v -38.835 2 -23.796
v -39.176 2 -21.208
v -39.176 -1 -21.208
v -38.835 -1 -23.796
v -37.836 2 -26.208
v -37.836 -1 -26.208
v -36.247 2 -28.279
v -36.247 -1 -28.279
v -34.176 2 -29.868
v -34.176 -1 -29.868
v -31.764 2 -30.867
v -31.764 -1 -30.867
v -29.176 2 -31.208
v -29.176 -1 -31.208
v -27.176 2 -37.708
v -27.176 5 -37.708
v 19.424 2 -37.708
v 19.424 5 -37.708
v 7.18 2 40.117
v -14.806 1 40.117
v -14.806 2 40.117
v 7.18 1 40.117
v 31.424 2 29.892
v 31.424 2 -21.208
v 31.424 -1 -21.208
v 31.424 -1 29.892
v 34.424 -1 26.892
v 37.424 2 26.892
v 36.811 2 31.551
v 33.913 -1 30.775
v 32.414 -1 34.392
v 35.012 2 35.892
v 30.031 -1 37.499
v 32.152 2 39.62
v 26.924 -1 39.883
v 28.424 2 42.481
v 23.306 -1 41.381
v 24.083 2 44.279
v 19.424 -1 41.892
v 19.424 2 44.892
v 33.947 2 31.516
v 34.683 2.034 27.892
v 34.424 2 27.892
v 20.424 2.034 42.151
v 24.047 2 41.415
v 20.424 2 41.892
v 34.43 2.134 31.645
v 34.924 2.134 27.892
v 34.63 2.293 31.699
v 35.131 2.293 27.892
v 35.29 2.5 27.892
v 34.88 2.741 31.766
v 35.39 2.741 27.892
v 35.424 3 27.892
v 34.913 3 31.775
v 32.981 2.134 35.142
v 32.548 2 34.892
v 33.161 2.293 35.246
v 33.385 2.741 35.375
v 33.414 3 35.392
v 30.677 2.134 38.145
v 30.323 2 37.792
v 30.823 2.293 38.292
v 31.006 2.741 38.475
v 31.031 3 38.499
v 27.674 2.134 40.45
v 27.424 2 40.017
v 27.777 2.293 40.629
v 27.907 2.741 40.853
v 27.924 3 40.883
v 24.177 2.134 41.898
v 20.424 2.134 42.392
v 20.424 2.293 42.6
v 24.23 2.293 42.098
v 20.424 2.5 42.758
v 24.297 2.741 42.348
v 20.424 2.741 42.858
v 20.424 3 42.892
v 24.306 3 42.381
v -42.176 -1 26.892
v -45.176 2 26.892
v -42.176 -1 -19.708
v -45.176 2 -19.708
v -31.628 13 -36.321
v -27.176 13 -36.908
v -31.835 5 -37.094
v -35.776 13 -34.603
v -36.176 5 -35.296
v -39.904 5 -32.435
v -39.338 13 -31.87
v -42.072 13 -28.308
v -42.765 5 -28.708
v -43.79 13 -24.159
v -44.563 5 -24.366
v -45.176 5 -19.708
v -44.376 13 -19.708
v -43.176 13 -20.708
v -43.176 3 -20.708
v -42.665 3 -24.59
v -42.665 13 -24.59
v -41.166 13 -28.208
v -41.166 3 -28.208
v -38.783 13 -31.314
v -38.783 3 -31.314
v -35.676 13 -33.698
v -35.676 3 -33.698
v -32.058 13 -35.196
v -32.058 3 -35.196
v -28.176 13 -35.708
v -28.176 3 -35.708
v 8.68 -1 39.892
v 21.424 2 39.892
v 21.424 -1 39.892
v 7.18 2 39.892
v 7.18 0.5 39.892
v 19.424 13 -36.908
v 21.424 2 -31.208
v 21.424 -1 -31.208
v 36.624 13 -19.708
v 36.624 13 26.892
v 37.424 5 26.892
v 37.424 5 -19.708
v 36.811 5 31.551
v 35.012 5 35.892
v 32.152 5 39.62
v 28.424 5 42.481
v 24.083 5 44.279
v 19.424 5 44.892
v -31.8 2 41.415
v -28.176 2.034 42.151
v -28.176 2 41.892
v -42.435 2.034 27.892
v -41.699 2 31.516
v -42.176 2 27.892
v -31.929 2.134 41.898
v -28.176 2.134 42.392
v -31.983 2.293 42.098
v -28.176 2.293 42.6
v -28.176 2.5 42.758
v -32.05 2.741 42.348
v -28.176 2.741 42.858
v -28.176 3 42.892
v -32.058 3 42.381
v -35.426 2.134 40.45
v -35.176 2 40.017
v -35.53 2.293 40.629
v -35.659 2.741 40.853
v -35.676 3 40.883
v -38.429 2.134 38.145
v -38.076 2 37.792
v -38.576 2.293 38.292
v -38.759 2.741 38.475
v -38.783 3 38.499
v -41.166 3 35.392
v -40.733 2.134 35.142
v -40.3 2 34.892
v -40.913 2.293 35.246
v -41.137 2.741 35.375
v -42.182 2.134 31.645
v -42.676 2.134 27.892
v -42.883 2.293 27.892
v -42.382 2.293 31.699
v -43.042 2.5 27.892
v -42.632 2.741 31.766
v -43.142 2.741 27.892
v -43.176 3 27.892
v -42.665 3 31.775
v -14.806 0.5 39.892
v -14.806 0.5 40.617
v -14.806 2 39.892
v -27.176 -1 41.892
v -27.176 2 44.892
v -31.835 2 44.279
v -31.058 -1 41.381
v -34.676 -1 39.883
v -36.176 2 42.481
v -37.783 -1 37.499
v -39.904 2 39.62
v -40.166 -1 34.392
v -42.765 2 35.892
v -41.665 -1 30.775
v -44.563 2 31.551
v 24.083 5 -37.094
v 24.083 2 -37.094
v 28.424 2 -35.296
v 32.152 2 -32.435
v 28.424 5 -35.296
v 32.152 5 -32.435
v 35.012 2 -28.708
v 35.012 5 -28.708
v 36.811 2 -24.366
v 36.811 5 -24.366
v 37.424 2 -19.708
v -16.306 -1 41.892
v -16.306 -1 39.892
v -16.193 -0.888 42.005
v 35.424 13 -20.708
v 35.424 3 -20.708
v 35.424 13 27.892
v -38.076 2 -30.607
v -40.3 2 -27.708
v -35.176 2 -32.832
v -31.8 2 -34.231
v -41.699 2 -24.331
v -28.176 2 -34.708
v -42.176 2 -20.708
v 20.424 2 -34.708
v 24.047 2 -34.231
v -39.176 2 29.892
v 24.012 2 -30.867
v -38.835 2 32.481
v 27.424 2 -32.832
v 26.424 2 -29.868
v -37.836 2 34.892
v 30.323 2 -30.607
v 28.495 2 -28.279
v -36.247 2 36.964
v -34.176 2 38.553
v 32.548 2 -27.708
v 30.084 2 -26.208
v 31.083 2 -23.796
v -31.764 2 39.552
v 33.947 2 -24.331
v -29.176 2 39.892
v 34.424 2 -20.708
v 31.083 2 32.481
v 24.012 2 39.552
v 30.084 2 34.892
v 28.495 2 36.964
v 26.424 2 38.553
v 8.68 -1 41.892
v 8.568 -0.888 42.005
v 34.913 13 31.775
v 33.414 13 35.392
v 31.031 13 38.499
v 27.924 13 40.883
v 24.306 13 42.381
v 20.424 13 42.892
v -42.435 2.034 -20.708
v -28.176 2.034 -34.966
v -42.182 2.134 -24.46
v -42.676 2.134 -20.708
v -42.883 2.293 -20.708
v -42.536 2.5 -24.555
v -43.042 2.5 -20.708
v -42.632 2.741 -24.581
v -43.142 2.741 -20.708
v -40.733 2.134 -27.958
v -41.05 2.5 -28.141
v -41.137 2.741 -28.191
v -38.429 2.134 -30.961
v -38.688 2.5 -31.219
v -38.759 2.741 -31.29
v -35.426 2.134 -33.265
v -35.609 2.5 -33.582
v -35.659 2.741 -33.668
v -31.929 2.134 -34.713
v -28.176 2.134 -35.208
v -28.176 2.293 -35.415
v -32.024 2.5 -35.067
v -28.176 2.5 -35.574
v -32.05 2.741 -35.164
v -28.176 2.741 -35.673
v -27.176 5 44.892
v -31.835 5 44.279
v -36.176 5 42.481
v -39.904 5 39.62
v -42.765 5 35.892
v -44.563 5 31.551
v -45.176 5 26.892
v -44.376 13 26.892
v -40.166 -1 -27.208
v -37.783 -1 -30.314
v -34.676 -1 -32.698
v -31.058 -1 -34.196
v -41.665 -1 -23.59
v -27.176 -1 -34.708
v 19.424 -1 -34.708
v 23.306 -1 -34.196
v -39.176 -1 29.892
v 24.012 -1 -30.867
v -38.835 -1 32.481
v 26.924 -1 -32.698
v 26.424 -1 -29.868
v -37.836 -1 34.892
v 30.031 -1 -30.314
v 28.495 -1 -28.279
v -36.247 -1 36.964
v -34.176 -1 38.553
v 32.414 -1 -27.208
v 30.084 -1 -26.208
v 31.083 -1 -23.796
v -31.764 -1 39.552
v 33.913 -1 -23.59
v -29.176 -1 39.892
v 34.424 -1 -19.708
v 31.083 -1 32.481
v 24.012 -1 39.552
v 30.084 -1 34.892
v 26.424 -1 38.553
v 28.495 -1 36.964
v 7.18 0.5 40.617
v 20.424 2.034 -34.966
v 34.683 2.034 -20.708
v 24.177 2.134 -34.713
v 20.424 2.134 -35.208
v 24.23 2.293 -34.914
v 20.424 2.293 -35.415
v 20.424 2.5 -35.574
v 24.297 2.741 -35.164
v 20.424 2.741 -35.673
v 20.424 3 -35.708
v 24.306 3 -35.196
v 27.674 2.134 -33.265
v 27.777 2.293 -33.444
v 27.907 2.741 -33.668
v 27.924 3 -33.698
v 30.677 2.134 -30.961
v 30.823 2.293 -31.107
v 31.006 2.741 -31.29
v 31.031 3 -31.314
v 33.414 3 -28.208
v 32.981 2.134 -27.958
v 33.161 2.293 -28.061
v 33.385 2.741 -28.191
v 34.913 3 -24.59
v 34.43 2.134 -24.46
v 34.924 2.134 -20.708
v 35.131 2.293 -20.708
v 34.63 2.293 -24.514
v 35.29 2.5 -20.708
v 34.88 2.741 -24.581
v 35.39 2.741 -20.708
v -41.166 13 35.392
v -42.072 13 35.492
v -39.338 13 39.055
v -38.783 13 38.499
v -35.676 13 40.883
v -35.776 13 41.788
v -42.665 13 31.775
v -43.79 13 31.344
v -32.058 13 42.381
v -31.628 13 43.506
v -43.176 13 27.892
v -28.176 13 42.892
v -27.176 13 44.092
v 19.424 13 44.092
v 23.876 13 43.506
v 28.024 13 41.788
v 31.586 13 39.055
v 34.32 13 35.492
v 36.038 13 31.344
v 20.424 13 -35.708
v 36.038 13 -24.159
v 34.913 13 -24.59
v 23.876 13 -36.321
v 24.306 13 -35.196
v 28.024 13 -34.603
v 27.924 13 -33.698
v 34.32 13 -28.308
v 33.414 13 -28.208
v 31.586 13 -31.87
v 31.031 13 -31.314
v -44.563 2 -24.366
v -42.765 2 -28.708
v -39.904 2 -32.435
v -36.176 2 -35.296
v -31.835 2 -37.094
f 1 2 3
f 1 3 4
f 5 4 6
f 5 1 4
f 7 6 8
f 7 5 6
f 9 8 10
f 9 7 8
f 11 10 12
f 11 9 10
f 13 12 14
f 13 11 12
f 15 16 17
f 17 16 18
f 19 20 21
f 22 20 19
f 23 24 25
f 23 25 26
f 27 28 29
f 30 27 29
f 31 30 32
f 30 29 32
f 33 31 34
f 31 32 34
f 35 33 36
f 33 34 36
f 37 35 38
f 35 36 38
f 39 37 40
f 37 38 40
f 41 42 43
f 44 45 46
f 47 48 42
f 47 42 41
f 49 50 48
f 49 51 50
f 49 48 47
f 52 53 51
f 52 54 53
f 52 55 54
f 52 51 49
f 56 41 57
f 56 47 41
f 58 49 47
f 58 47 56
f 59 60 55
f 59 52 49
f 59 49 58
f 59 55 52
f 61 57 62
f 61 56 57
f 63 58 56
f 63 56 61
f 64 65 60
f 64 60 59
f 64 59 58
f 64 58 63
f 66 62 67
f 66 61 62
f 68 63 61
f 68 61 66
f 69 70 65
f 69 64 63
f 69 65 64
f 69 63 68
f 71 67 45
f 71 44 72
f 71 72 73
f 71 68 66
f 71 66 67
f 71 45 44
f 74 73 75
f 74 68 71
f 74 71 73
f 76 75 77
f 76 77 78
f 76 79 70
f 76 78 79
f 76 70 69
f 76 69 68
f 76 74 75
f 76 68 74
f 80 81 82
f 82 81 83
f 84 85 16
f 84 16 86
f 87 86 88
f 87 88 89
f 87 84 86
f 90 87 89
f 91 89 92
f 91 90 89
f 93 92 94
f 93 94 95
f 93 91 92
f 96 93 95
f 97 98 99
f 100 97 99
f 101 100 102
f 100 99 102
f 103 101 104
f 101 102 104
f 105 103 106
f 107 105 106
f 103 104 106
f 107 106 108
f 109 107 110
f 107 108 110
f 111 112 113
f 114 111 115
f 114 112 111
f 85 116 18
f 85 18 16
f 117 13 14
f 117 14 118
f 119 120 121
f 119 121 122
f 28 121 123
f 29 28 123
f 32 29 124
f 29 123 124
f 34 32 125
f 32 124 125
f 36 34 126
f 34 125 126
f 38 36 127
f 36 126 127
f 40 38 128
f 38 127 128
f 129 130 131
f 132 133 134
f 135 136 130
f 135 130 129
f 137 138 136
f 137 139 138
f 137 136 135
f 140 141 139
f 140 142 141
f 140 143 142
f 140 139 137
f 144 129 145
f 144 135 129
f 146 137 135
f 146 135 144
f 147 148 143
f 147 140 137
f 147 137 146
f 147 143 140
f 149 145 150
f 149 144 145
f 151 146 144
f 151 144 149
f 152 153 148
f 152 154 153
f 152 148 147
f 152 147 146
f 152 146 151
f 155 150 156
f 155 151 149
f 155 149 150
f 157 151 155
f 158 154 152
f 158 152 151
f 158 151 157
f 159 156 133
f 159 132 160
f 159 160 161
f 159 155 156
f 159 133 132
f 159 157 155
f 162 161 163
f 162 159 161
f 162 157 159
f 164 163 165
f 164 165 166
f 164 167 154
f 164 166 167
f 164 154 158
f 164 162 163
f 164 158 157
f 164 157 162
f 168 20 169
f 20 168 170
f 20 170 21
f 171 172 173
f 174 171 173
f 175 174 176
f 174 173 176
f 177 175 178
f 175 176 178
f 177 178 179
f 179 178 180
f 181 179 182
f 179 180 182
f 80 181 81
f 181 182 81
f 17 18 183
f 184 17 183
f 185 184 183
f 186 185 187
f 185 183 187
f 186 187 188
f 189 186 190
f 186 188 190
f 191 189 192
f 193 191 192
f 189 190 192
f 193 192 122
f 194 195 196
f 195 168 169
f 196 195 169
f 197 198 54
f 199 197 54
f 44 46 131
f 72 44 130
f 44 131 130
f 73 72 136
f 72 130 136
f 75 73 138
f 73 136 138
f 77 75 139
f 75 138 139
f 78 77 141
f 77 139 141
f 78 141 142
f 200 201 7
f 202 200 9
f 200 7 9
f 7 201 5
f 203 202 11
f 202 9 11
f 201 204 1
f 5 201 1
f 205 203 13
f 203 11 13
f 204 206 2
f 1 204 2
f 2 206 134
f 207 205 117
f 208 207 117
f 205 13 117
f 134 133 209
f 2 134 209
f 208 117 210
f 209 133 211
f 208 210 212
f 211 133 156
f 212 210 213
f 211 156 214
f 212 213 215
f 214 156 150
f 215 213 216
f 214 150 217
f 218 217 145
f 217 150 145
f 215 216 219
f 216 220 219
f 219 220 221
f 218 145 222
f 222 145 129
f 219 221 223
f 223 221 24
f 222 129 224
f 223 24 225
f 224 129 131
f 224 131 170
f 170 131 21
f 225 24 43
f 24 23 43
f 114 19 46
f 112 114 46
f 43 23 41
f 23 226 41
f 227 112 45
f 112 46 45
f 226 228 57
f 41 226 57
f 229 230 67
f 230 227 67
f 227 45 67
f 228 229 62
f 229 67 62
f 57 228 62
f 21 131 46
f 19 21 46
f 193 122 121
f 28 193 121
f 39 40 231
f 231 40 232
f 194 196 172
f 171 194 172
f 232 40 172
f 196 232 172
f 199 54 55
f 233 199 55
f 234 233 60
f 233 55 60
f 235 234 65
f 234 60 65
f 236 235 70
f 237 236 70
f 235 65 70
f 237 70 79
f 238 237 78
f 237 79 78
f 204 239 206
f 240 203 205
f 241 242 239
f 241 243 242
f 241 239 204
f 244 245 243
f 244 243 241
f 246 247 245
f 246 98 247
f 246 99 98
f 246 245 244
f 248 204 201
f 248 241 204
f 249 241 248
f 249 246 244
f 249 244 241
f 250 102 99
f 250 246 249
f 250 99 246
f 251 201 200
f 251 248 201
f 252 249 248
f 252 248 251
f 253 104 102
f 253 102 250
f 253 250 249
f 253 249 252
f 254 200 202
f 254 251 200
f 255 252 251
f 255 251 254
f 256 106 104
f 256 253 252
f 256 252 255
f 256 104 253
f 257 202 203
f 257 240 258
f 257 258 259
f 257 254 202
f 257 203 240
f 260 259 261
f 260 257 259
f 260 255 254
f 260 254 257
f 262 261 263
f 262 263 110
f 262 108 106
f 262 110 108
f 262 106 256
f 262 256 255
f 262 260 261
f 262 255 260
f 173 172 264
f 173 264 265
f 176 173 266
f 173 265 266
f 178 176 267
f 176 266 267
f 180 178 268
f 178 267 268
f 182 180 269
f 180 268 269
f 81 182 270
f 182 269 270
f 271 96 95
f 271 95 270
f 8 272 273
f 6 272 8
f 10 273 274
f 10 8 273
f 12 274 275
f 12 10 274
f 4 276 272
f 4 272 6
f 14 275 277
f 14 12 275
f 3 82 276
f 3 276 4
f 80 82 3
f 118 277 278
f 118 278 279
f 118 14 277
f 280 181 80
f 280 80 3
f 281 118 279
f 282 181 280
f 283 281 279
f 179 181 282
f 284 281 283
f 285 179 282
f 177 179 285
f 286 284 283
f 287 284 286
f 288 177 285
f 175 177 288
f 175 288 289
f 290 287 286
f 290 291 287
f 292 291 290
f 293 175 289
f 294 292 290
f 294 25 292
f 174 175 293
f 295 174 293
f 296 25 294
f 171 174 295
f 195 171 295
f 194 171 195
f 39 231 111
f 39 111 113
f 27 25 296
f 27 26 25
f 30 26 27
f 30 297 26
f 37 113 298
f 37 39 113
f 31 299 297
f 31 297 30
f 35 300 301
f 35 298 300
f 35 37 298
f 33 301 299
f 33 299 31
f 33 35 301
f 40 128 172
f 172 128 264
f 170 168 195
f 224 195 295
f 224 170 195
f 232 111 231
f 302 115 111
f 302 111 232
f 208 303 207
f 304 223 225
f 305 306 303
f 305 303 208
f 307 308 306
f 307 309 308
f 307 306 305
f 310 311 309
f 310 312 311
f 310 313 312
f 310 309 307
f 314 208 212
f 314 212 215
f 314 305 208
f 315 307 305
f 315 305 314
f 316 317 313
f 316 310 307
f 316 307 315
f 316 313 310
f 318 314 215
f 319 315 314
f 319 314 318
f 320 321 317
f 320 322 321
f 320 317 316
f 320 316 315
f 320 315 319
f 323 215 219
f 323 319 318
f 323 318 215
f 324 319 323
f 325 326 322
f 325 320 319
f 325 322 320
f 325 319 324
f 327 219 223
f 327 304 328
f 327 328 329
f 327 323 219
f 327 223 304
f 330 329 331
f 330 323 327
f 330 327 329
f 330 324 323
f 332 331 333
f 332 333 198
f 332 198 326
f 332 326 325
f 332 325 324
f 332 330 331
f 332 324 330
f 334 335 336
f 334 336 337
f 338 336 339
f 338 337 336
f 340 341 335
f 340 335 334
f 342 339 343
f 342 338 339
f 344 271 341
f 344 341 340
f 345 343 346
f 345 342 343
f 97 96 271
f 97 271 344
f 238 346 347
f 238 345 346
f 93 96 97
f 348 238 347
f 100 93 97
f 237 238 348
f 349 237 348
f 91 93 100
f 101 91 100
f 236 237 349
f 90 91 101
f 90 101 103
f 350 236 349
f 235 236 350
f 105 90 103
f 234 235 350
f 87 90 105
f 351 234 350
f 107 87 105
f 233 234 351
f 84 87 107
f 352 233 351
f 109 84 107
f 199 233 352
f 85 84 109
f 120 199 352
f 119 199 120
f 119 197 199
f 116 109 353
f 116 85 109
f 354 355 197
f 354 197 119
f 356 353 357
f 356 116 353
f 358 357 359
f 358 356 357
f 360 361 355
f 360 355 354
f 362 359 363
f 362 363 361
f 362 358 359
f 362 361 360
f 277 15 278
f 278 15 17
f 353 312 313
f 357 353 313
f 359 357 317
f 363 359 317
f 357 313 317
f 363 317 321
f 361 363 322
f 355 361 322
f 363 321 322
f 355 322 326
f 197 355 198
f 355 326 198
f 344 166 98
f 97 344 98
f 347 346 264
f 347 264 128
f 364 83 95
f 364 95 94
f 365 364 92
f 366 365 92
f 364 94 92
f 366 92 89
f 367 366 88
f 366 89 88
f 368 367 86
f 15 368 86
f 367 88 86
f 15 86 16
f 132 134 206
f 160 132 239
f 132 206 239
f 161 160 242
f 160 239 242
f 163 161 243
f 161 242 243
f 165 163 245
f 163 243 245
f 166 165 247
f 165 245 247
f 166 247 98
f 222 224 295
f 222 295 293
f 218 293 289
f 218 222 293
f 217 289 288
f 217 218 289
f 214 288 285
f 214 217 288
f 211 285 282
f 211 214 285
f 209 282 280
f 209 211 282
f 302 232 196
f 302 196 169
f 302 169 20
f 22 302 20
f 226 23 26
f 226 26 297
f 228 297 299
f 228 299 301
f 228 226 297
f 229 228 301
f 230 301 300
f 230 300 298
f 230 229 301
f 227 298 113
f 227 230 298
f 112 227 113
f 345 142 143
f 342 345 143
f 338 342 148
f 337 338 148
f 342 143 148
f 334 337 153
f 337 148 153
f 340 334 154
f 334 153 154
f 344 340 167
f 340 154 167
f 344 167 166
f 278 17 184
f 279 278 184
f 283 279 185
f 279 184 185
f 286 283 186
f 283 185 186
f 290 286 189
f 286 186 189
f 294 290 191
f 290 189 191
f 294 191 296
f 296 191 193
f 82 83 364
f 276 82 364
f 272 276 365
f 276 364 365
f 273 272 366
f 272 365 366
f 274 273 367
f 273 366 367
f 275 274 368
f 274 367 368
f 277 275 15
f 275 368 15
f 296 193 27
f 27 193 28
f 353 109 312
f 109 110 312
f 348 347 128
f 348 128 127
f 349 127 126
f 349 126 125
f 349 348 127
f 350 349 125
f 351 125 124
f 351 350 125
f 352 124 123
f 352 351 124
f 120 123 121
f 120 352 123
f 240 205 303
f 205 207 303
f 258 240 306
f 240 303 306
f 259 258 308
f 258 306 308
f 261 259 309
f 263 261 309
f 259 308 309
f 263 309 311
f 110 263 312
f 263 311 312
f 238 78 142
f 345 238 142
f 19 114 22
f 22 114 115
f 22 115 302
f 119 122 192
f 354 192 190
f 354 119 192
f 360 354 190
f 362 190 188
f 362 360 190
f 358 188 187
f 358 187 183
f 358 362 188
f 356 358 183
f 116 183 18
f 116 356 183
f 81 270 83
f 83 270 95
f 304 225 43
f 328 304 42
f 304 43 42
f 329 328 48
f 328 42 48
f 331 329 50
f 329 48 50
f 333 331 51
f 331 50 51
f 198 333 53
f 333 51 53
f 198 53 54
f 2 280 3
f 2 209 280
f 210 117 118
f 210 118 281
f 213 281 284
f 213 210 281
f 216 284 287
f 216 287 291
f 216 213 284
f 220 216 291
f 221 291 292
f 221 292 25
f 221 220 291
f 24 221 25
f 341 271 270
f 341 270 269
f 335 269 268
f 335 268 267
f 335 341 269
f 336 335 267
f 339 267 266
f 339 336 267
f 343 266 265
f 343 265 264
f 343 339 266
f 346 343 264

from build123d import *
from OCP.BRepFilletAPI import BRepFilletAPI_MakeChamfer

# Parameters (mm, degrees)
BOSS_EXTRUDE1_DEPTH = 10
BOSS_EXTRUDE2_DEPTH = 2
FILLET1_R           = 1
BOSS_EXTRUDE3_DEPTH = 3
CHAMFER2_SIZE       = 8
CHAMFER2_SIZE2      = 0.8
BOSS_EXTRUDE4_START = -2
BOSS_EXTRUDE4_DEPTH = 2
BOSS_EXTRUDE5_DEPTH = 1
CHAMFER3_SIZE       = 3
SKETCH6_W           = 21.985963637
SKETCH6_H           = 0.240414759
CUT_EXTRUDE1_DEPTH  = 4
CHAMFER4_SIZE       = 2
CHAMFER5_SIZE       = 1.5
CHAMFER6_SIZE       = 1.5


with BuildPart() as part:
    # Sketch1 → Boss-Extrude1 (new body)
    with BuildSketch(Plane(origin=(0, 0, 0), x_dir=(1, 0, 0), z_dir=(0, 1, 0))):
        with BuildLine():
            Line((-27.176063521, 37.707550883), (19.423936479, 37.707550883))
            ThreePointArc((19.423936479, 37.707550883), (32.151858541, 32.435472945), (37.423936479, 19.707550883))
            Line((37.423936479, 19.707550883), (37.423936479, -26.892449117))
            ThreePointArc((37.423936479, -26.892449117), (32.151858541, -39.620371178), (19.423936479, -44.892449117))
            Line((19.423936479, -44.892449117), (-27.176063521, -44.892449117))
            ThreePointArc((-27.176063521, -44.892449117), (-39.903985582, -39.620371178), (-45.176063521, -26.892449117))
            Line((-45.176063521, -26.892449117), (-45.176063521, 19.707550883))
            ThreePointArc((-45.176063521, 19.707550883), (-39.903985582, 32.435472945), (-27.176063521, 37.707550883))
        make_face()
        with BuildLine():
            ThreePointArc((-28.176063521, 35.707550883), (-38.782665238, 31.314152601), (-43.176063521, 20.707550883))
            Line((-43.176063521, 20.707550883), (-43.176063521, -27.892449117))
            ThreePointArc((-43.176063521, -27.892449117), (-38.782665238, -38.499050834), (-28.176063521, -42.892449117))
            Line((-28.176063521, -42.892449117), (20.423936479, -42.892449117))
            ThreePointArc((20.423936479, -42.892449117), (31.030538197, -38.499050834), (35.423936479, -27.892449117))
            Line((35.423936479, -27.892449117), (35.423936479, 20.707550883))
            ThreePointArc((35.423936479, 20.707550883), (31.030538197, 31.314152601), (20.423936479, 35.707550883))
            Line((20.423936479, 35.707550883), (-28.176063521, 35.707550883))
        make_face(mode=Mode.SUBTRACT)
    extrude(amount=BOSS_EXTRUDE1_DEPTH)

    # Sketch1<3> → Boss-Extrude2 (add)
    with BuildSketch(Plane(origin=(0, 0, 0), x_dir=(1, 0, 0), z_dir=(0, 1, 0))):
        with BuildLine():
            Line((-28.176063521, 35.707550883), (20.423936479, 35.707550883))
            ThreePointArc((20.423936479, 35.707550883), (31.030538197, 31.314152601), (35.423936479, 20.707550883))
            Line((35.423936479, 20.707550883), (35.423936479, -27.892449117))
            ThreePointArc((35.423936479, -27.892449117), (31.030538197, -38.499050834), (20.423936479, -42.892449117))
            Line((20.423936479, -42.892449117), (-28.176063521, -42.892449117))
            ThreePointArc((-28.176063521, -42.892449117), (-38.782665238, -38.499050834), (-43.176063521, -27.892449117))
            Line((-43.176063521, -27.892449117), (-43.176063521, 20.707550883))
            ThreePointArc((-43.176063521, 20.707550883), (-38.782665238, 31.314152601), (-28.176063521, 35.707550883))
        make_face()
        with BuildLine():
            ThreePointArc((-30.176063521, 33.707550883), (-37.954238114, 30.485725476), (-41.176063521, 22.707550883))
            Line((-41.176063521, 22.707550883), (-41.176063521, -29.892449117))
            ThreePointArc((-41.176063521, -29.892449117), (-37.954238114, -37.67062371), (-30.176063521, -40.892449117))
            Line((-30.176063521, -40.892449117), (22.423936479, -40.892449117))
            ThreePointArc((22.423936479, -40.892449117), (30.202111072, -37.67062371), (33.423936479, -29.892449117))
            Line((33.423936479, -29.892449117), (33.423936479, 22.707550883))
            ThreePointArc((33.423936479, 22.707550883), (30.202111072, 30.485725476), (22.423936479, 33.707550883))
            Line((22.423936479, 33.707550883), (-30.176063521, 33.707550883))
        make_face(mode=Mode.SUBTRACT)
    extrude(amount=BOSS_EXTRUDE2_DEPTH)

    # Fillet1
    fillet1_edges = [part.edges().sort_by_distance(p)[0] for p in [
        (-3.876063521, 2, -35.707550883),
        (35.423936479, 2, 3.592449117),
        (31.030538197, 2, -31.314152601),
        (-38.782665238, 2, -31.314152601),
        (-43.176063521, 2, 3.592449117),
        (-38.782665238, 2, 38.499050834),
        (-3.876063521, 2, 42.892449117),
        (31.030538197, 2, 38.499050834),
    ]]
    fillet(fillet1_edges, radius=FILLET1_R)

    # Sketch2 → Boss-Extrude3 (add)
    with BuildSketch(Plane(origin=(0, 10, 0), x_dir=(1, 0, 0), z_dir=(0, 1, 0))):
        with BuildLine():
            Line((19.423936479, 37.707550883), (-27.176063521, 37.707550883))
            ThreePointArc((-27.176063521, 37.707550883), (-39.903985582, 32.435472945), (-45.176063521, 19.707550883))
            Line((-45.176063521, 19.707550883), (-45.176063521, -26.892449117))
            ThreePointArc((-45.176063521, -26.892449117), (-39.903985582, -39.620371178), (-27.176063521, -44.892449117))
            Line((-27.176063521, -44.892449117), (19.423936479, -44.892449117))
            ThreePointArc((19.423936479, -44.892449117), (32.151858541, -39.620371178), (37.423936479, -26.892449117))
            Line((37.423936479, -26.892449117), (37.423936479, 19.707550883))
            ThreePointArc((37.423936479, 19.707550883), (32.151858541, 32.435472945), (19.423936479, 37.707550883))
        make_face()
        with BuildLine():
            Line((-28.176063521, 35.707550883), (20.423936479, 35.707550883))
            ThreePointArc((20.423936479, 35.707550883), (31.030538197, 31.314152601), (35.423936479, 20.707550883))
            Line((35.423936479, 20.707550883), (35.423936479, -27.892449117))
            ThreePointArc((35.423936479, -27.892449117), (31.030538197, -38.499050834), (20.423936479, -42.892449117))
            Line((20.423936479, -42.892449117), (-28.176063521, -42.892449117))
            ThreePointArc((-28.176063521, -42.892449117), (-38.782665238, -38.499050834), (-43.176063521, -27.892449117))
            Line((-43.176063521, -27.892449117), (-43.176063521, 20.707550883))
            ThreePointArc((-43.176063521, 20.707550883), (-38.782665238, 31.314152601), (-28.176063521, 35.707550883))
        make_face(mode=Mode.SUBTRACT)
    extrude(amount=BOSS_EXTRUDE3_DEPTH)

    # Chamfer2: one chamfer whose edges measure the first distance from different faces: ONE call of the kernel's chamfer builder (chamfer() names one face for all edges)
    chamfer2_edges_1 = [part.edges().sort_by_distance(p)[0] for p in [
        (32.151858541, 13, -32.435472945),
    ]]
    chamfer2_side_1 = [part.faces().sort_by_distance(p)[0] for p in [
        (32.151858541, 6.5, -32.435472945),
    ]]
    chamfer2_edges_2 = [part.edges().sort_by_distance(p)[0] for p in [
        (-3.876063521, 13, -37.707550883),
    ]]
    chamfer2_side_2 = [part.faces().sort_by_distance(p)[0] for p in [
        (-3.876063521, 6.5, -37.707550883),
    ]]
    chamfer2_edges_3 = [part.edges().sort_by_distance(p)[0] for p in [
        (-39.903985582, 13, -32.435472945),
    ]]
    chamfer2_side_3 = [part.faces().sort_by_distance(p)[0] for p in [
        (-39.903985582, 6.5, -32.435472945),
    ]]
    chamfer2_edges_4 = [part.edges().sort_by_distance(p)[0] for p in [
        (-45.176063521, 13, 3.592449117),
    ]]
    chamfer2_side_4 = [part.faces().sort_by_distance(p)[0] for p in [
        (-45.176063521, 6.5, 3.592449117),
    ]]
    chamfer2_edges_5 = [part.edges().sort_by_distance(p)[0] for p in [
        (-39.903985582, 13, 39.620371178),
    ]]
    chamfer2_side_5 = [part.faces().sort_by_distance(p)[0] for p in [
        (-39.903985582, 6.5, 39.620371178),
    ]]
    chamfer2_edges_6 = [part.edges().sort_by_distance(p)[0] for p in [
        (-3.876063521, 13, 44.892449117),
    ]]
    chamfer2_side_6 = [part.faces().sort_by_distance(p)[0] for p in [
        (-3.876063521, 6.5, 44.892449117),
    ]]
    chamfer2_edges_7 = [part.edges().sort_by_distance(p)[0] for p in [
        (32.151858541, 13, 39.620371178),
    ]]
    chamfer2_side_7 = [part.faces().sort_by_distance(p)[0] for p in [
        (32.151858541, 6.5, 39.620371178),
    ]]
    chamfer2_edges_8 = [part.edges().sort_by_distance(p)[0] for p in [
        (37.423936479, 13, 3.592449117),
    ]]
    chamfer2_side_8 = [part.faces().sort_by_distance(p)[0] for p in [
        (37.423936479, 6.5, 3.592449117),
    ]]
    chamfer2 = BRepFilletAPI_MakeChamfer(part.part.solid().wrapped)
    for e in chamfer2_edges_1:
        chamfer2.Add(CHAMFER2_SIZE, CHAMFER2_SIZE2, e.wrapped, chamfer2_side_1[0].wrapped)  # the first distance lies on this face
    for e in chamfer2_edges_2:
        chamfer2.Add(CHAMFER2_SIZE, CHAMFER2_SIZE2, e.wrapped, chamfer2_side_2[0].wrapped)  # the first distance lies on this face
    for e in chamfer2_edges_3:
        chamfer2.Add(CHAMFER2_SIZE, CHAMFER2_SIZE2, e.wrapped, chamfer2_side_3[0].wrapped)  # the first distance lies on this face
    for e in chamfer2_edges_4:
        chamfer2.Add(CHAMFER2_SIZE, CHAMFER2_SIZE2, e.wrapped, chamfer2_side_4[0].wrapped)  # the first distance lies on this face
    for e in chamfer2_edges_5:
        chamfer2.Add(CHAMFER2_SIZE, CHAMFER2_SIZE2, e.wrapped, chamfer2_side_5[0].wrapped)  # the first distance lies on this face
    for e in chamfer2_edges_6:
        chamfer2.Add(CHAMFER2_SIZE, CHAMFER2_SIZE2, e.wrapped, chamfer2_side_6[0].wrapped)  # the first distance lies on this face
    for e in chamfer2_edges_7:
        chamfer2.Add(CHAMFER2_SIZE, CHAMFER2_SIZE2, e.wrapped, chamfer2_side_7[0].wrapped)  # the first distance lies on this face
    for e in chamfer2_edges_8:
        chamfer2.Add(CHAMFER2_SIZE, CHAMFER2_SIZE2, e.wrapped, chamfer2_side_8[0].wrapped)  # the first distance lies on this face
    add(Compound.cast(chamfer2.Shape()), mode=Mode.REPLACE)

    # Sketch3 → Boss-Extrude4 (add)
    with BuildSketch(Plane.XZ.offset(BOSS_EXTRUDE4_START)):
        with BuildLine():
            Line((-30.176063521, -33.707550883), (22.423936479, -33.707550883))
            ThreePointArc((22.423936479, -33.707550883), (30.202111072, -30.485725476), (33.423936479, -22.707550883))
            Line((33.423936479, -22.707550883), (33.423936479, 29.892449117))
            ThreePointArc((33.423936479, 29.892449117), (30.202111072, 37.67062371), (22.423936479, 40.892449117))
            Line((22.423936479, 40.892449117), (-30.176063521, 40.892449117))
            ThreePointArc((-30.176063521, 40.892449117), (-37.954238114, 37.67062371), (-41.176063521, 29.892449117))
            Line((-41.176063521, 29.892449117), (-41.176063521, -22.707550883))
            ThreePointArc((-41.176063521, -22.707550883), (-37.954238114, -30.485725476), (-30.176063521, -33.707550883))
        make_face()
        with BuildLine():
            Line((-29.176063521, -31.207550883), (21.423936479, -31.207550883))
            ThreePointArc((21.423936479, -31.207550883), (28.495004291, -28.278618695), (31.423936479, -21.207550883))
            Line((31.423936479, -21.207550883), (31.423936479, 29.892449117))
            ThreePointArc((31.423936479, 29.892449117), (28.495004291, 36.963516928), (21.423936479, 39.892449117))
            Line((21.423936479, 39.892449117), (-29.176063521, 39.892449117))
            ThreePointArc((-29.176063521, 39.892449117), (-36.247131332, 36.963516928), (-39.176063521, 29.892449117))
            Line((-39.176063521, 29.892449117), (-39.176063521, -21.207550883))
            ThreePointArc((-39.176063521, -21.207550883), (-36.247131332, -28.278618695), (-29.176063521, -31.207550883))
        make_face(mode=Mode.SUBTRACT)
    extrude(amount=BOSS_EXTRUDE4_DEPTH)

    # Sketch5 → Boss-Extrude5 (add)
    with BuildSketch(Plane.XZ):
        with BuildLine():
            Line((-27.176063521, -37.707550883), (19.423936479, -37.707550883))
            ThreePointArc((19.423936479, -37.707550883), (32.151858541, -32.435472945), (37.423936479, -19.707550883))
            Line((37.423936479, -19.707550883), (37.423936479, 26.892449117))
            ThreePointArc((37.423936479, 26.892449117), (32.151858541, 39.620371178), (19.423936479, 44.892449117))
            Line((19.423936479, 44.892449117), (-27.176063521, 44.892449117))
            ThreePointArc((-27.176063521, 44.892449117), (-39.903985582, 39.620371178), (-45.176063521, 26.892449117))
            Line((-45.176063521, 26.892449117), (-45.176063521, -19.707550883))
            ThreePointArc((-45.176063521, -19.707550883), (-39.903985582, -32.435472945), (-27.176063521, -37.707550883))
        make_face()
        with BuildLine():
            Line((-39.176063521, 29.892449117), (-39.176063521, -21.207550883))
            ThreePointArc((-39.176063521, -21.207550883), (-36.247131332, -28.278618695), (-29.176063521, -31.207550883))
            Line((-29.176063521, -31.207550883), (21.423936479, -31.207550883))
            ThreePointArc((21.423936479, -31.207550883), (28.495004291, -28.278618695), (31.423936479, -21.207550883))
            Line((31.423936479, -21.207550883), (31.423936479, 29.892449117))
            ThreePointArc((31.423936479, 29.892449117), (28.495004291, 36.963516928), (21.423936479, 39.892449117))
            Line((21.423936479, 39.892449117), (-29.176063521, 39.892449117))
            ThreePointArc((-29.176063521, 39.892449117), (-36.247131332, 36.963516928), (-39.176063521, 29.892449117))
        make_face(mode=Mode.SUBTRACT)
    extrude(amount=BOSS_EXTRUDE5_DEPTH)

    # Chamfer3
    chamfer3_edges = [part.edges().sort_by_distance(p)[0] for p in [
        (-39.903985582, -1, -32.435472945),
        (-3.876063521, -1, -37.707550883),
        (32.151858541, -1, -32.435472945),
        (37.423936479, -1, 3.592449117),
        (32.151858541, -1, 39.620371178),
        (-3.876063521, -1, 44.892449117),
        (-39.903985582, -1, 39.620371178),
        (-45.176063521, -1, 3.592449117),
    ]]
    chamfer(chamfer3_edges, length=CHAMFER3_SIZE)

    # Sketch6 → Cut-Extrude1 (cut)
    with BuildSketch(Plane.XZ.offset(1)):
        with Locations((-3.812767506, 39.996881837)):
            Rectangle(SKETCH6_W, SKETCH6_H)
    extrude(amount=-CUT_EXTRUDE1_DEPTH, mode=Mode.SUBTRACT)

    # Chamfer4
    # the kernel refuses this chamfer: 2 mm, written as the material it takes off along each edge
    with BuildSketch(Plane(origin=(7.180214313, -1, 40.117089217), x_dir=(0, -0.027495876610586403, 0.9996219169112968), z_dir=(-1, 0, 0))) as chamfer4_piece_1:
        Polygon((CHAMFER4_SIZE * 0.999621916911, CHAMFER4_SIZE * 0.0274958766106), (-CHAMFER4_SIZE * 0.0274958766106, CHAMFER4_SIZE * 0.999621916911), (0, 0), align=None)
    extrude(amount=21.985963637, mode=Mode.SUBTRACT)

    # Chamfer5
    chamfer5_edges = [part.edges().sort_by_distance(p)[0] for p in [
        (7.180214313, -1, 40.892449117),
    ]]
    chamfer(chamfer5_edges, length=CHAMFER5_SIZE)

    # Chamfer6
    chamfer6_edges = [part.edges().sort_by_distance(p)[0] for p in [
        (-14.805749324, -1, 40.892449117),
    ]]
    chamfer(chamfer6_edges, length=CHAMFER6_SIZE)


solid = part.part
